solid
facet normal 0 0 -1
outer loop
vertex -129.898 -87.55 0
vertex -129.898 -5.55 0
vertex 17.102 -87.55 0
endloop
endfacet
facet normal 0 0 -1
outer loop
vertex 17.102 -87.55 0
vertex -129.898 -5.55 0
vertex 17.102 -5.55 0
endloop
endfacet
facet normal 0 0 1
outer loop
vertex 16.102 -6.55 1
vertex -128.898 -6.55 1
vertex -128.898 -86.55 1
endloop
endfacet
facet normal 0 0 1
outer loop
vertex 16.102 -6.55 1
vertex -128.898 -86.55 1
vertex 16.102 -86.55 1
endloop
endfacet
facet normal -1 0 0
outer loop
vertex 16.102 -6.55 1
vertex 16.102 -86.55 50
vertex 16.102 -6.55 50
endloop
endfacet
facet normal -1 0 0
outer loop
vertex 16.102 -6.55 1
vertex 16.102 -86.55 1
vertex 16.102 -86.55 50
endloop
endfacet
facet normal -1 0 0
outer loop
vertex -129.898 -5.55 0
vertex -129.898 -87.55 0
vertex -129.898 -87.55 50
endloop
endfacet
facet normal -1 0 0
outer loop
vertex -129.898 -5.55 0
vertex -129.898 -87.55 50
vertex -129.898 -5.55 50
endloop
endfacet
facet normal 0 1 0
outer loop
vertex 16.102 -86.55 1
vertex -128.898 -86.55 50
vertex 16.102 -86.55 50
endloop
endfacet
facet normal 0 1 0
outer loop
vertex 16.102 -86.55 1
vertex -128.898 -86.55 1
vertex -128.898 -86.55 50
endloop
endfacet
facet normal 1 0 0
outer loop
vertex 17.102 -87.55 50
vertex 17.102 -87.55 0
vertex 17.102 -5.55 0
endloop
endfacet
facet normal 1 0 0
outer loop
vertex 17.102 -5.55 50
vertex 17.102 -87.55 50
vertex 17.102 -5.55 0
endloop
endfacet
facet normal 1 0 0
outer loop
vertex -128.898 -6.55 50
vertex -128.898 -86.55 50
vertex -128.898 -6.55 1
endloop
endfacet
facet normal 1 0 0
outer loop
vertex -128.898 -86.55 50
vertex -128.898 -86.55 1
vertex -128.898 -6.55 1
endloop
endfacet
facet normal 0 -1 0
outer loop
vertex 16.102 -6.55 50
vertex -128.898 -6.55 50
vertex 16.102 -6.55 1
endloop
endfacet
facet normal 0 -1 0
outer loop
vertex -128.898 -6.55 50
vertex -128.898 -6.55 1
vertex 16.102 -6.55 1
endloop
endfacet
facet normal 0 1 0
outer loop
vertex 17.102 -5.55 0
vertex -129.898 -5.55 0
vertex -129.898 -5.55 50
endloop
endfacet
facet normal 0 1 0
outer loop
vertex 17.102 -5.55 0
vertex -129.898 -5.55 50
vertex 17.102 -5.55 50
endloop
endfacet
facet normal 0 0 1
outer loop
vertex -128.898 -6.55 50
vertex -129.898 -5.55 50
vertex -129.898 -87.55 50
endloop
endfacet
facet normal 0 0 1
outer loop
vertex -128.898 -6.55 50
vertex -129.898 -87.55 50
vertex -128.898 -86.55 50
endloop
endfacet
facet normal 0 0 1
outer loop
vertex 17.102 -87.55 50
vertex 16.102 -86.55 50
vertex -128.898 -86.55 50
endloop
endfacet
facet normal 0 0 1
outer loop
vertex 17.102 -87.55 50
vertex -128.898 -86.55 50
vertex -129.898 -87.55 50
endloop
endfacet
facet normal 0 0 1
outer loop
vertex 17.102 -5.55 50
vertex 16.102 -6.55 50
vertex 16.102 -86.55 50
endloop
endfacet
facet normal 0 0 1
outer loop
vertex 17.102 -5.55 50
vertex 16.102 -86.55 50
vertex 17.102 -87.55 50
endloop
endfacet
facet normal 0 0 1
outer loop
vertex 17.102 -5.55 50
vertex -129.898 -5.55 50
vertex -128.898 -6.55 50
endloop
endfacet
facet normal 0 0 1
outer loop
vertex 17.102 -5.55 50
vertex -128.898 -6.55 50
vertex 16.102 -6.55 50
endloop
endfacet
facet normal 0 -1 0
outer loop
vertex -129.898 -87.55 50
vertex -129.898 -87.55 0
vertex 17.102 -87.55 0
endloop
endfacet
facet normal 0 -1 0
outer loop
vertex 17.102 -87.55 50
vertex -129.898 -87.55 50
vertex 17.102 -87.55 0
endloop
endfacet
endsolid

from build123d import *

# Parameters (mm, degrees)
F0_W     = 147
F0_H     = 82
F1_DEPTH = 50
F2_T     = -1


with BuildPart() as f1:
    # F0 (on Top) → F1 (new body)
    with BuildSketch(Plane.XY):
        with Locations((-95.298209, -46.550309)):
            Rectangle(F0_W, F0_H)
    extrude(amount=F1_DEPTH)

    # F2
    f2_openings = [f1.faces().sort_by_distance(p)[0] for p in [
        (-95.298209, -46.550309, 50),
    ]]
    offset(amount=F2_T, openings=f2_openings)


with BuildPart() as f1_1:
    # F3: moved
    add(f1.part.moved(Location((38.9, 0, 0))))


solid = f1_1.part
